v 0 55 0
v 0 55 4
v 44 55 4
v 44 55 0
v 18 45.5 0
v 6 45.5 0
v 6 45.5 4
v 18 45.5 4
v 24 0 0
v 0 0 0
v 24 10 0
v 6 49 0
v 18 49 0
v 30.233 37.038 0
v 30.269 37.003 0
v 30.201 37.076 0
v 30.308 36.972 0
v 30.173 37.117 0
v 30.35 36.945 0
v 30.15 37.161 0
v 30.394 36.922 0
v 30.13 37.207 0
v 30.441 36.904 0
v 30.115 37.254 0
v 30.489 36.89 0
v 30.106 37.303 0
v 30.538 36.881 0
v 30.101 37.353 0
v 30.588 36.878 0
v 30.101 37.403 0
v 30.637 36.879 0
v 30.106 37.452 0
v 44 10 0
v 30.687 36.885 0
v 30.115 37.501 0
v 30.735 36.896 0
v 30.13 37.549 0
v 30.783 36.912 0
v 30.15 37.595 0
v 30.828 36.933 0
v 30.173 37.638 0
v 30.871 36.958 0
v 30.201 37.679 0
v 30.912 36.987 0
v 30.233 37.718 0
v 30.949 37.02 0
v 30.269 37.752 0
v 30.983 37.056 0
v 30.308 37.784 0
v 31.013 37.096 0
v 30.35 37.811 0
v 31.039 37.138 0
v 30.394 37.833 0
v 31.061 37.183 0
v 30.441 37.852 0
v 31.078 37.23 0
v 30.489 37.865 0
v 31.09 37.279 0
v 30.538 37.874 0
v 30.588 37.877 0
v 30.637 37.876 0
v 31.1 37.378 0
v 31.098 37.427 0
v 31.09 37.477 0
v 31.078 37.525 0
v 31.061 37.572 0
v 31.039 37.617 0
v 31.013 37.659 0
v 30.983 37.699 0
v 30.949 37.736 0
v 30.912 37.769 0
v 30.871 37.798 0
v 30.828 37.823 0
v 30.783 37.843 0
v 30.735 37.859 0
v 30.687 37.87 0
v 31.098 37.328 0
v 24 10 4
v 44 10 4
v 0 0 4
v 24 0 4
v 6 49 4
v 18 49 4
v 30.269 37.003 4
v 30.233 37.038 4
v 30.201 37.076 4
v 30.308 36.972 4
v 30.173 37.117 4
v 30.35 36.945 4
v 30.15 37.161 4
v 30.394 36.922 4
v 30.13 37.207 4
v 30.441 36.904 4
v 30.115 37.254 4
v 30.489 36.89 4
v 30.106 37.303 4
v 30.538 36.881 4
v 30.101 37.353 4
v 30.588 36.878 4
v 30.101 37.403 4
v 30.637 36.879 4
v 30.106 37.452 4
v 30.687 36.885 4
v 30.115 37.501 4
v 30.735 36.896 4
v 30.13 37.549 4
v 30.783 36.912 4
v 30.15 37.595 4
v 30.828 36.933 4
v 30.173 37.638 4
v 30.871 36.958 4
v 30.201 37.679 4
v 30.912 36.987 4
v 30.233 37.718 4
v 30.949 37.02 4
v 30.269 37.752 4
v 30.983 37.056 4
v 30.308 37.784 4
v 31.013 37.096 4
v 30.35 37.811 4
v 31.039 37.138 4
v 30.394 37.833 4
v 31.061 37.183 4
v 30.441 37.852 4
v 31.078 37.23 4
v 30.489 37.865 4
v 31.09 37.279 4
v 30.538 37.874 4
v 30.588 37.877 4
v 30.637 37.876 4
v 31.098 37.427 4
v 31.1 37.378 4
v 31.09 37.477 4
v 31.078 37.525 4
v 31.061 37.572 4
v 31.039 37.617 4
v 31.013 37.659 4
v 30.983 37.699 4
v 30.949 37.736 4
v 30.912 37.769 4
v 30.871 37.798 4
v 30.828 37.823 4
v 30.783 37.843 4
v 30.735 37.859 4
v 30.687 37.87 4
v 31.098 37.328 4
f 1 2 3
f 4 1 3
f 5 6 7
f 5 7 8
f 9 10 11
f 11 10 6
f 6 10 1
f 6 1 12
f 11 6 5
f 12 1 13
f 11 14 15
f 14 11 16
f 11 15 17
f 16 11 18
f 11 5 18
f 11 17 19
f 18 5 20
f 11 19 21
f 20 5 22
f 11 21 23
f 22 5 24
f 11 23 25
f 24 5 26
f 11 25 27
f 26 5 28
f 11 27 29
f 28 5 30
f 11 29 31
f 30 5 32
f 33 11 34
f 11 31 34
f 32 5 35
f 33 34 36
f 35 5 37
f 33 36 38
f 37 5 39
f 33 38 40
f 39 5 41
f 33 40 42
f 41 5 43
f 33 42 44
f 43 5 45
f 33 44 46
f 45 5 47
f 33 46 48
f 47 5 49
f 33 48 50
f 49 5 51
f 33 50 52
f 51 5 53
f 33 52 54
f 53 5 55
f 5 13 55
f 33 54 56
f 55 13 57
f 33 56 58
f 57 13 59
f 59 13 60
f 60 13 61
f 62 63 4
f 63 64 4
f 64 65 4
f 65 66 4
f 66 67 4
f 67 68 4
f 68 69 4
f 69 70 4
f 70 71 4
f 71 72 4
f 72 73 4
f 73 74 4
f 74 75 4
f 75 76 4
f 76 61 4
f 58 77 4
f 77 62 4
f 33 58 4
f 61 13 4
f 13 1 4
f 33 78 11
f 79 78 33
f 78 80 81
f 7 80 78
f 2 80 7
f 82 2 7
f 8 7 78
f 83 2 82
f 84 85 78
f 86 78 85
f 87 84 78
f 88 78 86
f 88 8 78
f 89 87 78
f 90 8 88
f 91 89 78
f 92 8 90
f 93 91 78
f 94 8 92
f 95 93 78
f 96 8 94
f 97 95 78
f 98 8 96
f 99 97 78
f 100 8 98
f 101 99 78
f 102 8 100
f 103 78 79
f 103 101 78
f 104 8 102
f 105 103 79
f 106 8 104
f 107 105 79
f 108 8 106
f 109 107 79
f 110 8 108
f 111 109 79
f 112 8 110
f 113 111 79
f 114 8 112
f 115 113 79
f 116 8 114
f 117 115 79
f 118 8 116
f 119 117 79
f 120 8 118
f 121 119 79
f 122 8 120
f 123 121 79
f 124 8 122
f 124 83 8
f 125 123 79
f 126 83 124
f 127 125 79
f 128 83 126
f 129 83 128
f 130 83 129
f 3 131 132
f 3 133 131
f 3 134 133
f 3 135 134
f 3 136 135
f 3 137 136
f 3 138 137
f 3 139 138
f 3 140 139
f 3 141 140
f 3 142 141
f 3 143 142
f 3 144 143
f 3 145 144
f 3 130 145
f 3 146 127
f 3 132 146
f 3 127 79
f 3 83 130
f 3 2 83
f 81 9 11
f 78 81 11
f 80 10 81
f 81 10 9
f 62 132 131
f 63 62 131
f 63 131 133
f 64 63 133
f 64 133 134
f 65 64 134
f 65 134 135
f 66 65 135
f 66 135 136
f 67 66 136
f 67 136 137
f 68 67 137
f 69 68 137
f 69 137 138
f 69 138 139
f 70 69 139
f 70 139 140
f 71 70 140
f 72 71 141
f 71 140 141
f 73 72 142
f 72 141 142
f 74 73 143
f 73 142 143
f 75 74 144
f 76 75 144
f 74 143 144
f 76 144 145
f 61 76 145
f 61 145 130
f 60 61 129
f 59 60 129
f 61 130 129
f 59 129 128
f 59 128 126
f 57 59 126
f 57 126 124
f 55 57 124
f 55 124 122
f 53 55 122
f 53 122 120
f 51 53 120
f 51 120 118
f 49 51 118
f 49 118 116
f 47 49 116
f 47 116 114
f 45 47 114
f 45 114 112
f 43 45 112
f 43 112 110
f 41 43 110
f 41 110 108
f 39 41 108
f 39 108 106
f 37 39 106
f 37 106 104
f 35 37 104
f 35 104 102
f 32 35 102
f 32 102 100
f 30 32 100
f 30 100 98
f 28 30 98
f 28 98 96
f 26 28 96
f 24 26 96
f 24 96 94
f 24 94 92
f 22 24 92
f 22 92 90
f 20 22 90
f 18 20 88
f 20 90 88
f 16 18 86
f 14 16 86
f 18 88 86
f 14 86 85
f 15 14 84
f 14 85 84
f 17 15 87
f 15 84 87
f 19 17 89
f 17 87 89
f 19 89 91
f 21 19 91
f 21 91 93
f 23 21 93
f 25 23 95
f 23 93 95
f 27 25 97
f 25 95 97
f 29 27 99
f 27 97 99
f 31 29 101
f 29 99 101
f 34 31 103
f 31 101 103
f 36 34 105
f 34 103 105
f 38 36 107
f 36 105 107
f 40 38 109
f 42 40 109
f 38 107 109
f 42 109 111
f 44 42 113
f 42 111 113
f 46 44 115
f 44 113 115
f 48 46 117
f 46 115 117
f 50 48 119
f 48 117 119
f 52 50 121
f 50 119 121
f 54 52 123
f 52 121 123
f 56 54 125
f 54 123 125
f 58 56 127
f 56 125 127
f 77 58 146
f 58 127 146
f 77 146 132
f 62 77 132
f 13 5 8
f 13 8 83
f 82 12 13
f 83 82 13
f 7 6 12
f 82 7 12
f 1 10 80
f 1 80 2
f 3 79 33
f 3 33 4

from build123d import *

# Parameters (mm, degrees)
SKIZZE1_W                       = 24
SKIZZE1_H                       = 55
SKIZZE1_W_2                     = 12
SKIZZE1_H_2                     = 3.5
AUFSATZ_LINEAR_AUSTRAGEN1_DEPTH = 4
SKIZZE3_W                       = 20
SKIZZE3_H                       = 45
AUFSATZ_LINEAR_AUSTRAGEN3_DEPTH = 4
SCHNITT_LINEAR_AUSTRAGEN1_REACH = 6
SKIZZE4_R                       = 0.5


with BuildPart() as part:
    # Skizze1 → Aufsatz-Linear austragen1 (new body)
    with BuildSketch(Plane.XY):
        with Locations((12, 27.5)):
            Rectangle(SKIZZE1_W, SKIZZE1_H)
        with Locations((12, 47.25)):
            Rectangle(SKIZZE1_W_2, SKIZZE1_H_2, mode=Mode.SUBTRACT)
    extrude(amount=AUFSATZ_LINEAR_AUSTRAGEN1_DEPTH)

    # Skizze3 → Aufsatz-Linear austragen3 (add)
    with BuildSketch(Plane.XY.offset(4)):
        with Locations((34, 32.5)):
            Rectangle(SKIZZE3_W, SKIZZE3_H)
    extrude(amount=-AUFSATZ_LINEAR_AUSTRAGEN3_DEPTH)

    # Skizze4 → Schnitt-Linear austragen1 (cut, up to next)
    with BuildSketch(Plane.XY.offset(4), mode=Mode.PRIVATE) as schnitt_linear_austragen1_sk1:
        with Locations((30.6, 37.377592673)):
            Circle(SKIZZE4_R)
    schnitt_linear_austragen1_tool1 = extrude(schnitt_linear_austragen1_sk1.sketch, amount=-SCHNITT_LINEAR_AUSTRAGEN1_REACH, mode=Mode.PRIVATE) & part.part
    add(schnitt_linear_austragen1_tool1.solids().sort_by_distance((30.6, 37.377593, 4))[0], mode=Mode.SUBTRACT)


solid = part.part
